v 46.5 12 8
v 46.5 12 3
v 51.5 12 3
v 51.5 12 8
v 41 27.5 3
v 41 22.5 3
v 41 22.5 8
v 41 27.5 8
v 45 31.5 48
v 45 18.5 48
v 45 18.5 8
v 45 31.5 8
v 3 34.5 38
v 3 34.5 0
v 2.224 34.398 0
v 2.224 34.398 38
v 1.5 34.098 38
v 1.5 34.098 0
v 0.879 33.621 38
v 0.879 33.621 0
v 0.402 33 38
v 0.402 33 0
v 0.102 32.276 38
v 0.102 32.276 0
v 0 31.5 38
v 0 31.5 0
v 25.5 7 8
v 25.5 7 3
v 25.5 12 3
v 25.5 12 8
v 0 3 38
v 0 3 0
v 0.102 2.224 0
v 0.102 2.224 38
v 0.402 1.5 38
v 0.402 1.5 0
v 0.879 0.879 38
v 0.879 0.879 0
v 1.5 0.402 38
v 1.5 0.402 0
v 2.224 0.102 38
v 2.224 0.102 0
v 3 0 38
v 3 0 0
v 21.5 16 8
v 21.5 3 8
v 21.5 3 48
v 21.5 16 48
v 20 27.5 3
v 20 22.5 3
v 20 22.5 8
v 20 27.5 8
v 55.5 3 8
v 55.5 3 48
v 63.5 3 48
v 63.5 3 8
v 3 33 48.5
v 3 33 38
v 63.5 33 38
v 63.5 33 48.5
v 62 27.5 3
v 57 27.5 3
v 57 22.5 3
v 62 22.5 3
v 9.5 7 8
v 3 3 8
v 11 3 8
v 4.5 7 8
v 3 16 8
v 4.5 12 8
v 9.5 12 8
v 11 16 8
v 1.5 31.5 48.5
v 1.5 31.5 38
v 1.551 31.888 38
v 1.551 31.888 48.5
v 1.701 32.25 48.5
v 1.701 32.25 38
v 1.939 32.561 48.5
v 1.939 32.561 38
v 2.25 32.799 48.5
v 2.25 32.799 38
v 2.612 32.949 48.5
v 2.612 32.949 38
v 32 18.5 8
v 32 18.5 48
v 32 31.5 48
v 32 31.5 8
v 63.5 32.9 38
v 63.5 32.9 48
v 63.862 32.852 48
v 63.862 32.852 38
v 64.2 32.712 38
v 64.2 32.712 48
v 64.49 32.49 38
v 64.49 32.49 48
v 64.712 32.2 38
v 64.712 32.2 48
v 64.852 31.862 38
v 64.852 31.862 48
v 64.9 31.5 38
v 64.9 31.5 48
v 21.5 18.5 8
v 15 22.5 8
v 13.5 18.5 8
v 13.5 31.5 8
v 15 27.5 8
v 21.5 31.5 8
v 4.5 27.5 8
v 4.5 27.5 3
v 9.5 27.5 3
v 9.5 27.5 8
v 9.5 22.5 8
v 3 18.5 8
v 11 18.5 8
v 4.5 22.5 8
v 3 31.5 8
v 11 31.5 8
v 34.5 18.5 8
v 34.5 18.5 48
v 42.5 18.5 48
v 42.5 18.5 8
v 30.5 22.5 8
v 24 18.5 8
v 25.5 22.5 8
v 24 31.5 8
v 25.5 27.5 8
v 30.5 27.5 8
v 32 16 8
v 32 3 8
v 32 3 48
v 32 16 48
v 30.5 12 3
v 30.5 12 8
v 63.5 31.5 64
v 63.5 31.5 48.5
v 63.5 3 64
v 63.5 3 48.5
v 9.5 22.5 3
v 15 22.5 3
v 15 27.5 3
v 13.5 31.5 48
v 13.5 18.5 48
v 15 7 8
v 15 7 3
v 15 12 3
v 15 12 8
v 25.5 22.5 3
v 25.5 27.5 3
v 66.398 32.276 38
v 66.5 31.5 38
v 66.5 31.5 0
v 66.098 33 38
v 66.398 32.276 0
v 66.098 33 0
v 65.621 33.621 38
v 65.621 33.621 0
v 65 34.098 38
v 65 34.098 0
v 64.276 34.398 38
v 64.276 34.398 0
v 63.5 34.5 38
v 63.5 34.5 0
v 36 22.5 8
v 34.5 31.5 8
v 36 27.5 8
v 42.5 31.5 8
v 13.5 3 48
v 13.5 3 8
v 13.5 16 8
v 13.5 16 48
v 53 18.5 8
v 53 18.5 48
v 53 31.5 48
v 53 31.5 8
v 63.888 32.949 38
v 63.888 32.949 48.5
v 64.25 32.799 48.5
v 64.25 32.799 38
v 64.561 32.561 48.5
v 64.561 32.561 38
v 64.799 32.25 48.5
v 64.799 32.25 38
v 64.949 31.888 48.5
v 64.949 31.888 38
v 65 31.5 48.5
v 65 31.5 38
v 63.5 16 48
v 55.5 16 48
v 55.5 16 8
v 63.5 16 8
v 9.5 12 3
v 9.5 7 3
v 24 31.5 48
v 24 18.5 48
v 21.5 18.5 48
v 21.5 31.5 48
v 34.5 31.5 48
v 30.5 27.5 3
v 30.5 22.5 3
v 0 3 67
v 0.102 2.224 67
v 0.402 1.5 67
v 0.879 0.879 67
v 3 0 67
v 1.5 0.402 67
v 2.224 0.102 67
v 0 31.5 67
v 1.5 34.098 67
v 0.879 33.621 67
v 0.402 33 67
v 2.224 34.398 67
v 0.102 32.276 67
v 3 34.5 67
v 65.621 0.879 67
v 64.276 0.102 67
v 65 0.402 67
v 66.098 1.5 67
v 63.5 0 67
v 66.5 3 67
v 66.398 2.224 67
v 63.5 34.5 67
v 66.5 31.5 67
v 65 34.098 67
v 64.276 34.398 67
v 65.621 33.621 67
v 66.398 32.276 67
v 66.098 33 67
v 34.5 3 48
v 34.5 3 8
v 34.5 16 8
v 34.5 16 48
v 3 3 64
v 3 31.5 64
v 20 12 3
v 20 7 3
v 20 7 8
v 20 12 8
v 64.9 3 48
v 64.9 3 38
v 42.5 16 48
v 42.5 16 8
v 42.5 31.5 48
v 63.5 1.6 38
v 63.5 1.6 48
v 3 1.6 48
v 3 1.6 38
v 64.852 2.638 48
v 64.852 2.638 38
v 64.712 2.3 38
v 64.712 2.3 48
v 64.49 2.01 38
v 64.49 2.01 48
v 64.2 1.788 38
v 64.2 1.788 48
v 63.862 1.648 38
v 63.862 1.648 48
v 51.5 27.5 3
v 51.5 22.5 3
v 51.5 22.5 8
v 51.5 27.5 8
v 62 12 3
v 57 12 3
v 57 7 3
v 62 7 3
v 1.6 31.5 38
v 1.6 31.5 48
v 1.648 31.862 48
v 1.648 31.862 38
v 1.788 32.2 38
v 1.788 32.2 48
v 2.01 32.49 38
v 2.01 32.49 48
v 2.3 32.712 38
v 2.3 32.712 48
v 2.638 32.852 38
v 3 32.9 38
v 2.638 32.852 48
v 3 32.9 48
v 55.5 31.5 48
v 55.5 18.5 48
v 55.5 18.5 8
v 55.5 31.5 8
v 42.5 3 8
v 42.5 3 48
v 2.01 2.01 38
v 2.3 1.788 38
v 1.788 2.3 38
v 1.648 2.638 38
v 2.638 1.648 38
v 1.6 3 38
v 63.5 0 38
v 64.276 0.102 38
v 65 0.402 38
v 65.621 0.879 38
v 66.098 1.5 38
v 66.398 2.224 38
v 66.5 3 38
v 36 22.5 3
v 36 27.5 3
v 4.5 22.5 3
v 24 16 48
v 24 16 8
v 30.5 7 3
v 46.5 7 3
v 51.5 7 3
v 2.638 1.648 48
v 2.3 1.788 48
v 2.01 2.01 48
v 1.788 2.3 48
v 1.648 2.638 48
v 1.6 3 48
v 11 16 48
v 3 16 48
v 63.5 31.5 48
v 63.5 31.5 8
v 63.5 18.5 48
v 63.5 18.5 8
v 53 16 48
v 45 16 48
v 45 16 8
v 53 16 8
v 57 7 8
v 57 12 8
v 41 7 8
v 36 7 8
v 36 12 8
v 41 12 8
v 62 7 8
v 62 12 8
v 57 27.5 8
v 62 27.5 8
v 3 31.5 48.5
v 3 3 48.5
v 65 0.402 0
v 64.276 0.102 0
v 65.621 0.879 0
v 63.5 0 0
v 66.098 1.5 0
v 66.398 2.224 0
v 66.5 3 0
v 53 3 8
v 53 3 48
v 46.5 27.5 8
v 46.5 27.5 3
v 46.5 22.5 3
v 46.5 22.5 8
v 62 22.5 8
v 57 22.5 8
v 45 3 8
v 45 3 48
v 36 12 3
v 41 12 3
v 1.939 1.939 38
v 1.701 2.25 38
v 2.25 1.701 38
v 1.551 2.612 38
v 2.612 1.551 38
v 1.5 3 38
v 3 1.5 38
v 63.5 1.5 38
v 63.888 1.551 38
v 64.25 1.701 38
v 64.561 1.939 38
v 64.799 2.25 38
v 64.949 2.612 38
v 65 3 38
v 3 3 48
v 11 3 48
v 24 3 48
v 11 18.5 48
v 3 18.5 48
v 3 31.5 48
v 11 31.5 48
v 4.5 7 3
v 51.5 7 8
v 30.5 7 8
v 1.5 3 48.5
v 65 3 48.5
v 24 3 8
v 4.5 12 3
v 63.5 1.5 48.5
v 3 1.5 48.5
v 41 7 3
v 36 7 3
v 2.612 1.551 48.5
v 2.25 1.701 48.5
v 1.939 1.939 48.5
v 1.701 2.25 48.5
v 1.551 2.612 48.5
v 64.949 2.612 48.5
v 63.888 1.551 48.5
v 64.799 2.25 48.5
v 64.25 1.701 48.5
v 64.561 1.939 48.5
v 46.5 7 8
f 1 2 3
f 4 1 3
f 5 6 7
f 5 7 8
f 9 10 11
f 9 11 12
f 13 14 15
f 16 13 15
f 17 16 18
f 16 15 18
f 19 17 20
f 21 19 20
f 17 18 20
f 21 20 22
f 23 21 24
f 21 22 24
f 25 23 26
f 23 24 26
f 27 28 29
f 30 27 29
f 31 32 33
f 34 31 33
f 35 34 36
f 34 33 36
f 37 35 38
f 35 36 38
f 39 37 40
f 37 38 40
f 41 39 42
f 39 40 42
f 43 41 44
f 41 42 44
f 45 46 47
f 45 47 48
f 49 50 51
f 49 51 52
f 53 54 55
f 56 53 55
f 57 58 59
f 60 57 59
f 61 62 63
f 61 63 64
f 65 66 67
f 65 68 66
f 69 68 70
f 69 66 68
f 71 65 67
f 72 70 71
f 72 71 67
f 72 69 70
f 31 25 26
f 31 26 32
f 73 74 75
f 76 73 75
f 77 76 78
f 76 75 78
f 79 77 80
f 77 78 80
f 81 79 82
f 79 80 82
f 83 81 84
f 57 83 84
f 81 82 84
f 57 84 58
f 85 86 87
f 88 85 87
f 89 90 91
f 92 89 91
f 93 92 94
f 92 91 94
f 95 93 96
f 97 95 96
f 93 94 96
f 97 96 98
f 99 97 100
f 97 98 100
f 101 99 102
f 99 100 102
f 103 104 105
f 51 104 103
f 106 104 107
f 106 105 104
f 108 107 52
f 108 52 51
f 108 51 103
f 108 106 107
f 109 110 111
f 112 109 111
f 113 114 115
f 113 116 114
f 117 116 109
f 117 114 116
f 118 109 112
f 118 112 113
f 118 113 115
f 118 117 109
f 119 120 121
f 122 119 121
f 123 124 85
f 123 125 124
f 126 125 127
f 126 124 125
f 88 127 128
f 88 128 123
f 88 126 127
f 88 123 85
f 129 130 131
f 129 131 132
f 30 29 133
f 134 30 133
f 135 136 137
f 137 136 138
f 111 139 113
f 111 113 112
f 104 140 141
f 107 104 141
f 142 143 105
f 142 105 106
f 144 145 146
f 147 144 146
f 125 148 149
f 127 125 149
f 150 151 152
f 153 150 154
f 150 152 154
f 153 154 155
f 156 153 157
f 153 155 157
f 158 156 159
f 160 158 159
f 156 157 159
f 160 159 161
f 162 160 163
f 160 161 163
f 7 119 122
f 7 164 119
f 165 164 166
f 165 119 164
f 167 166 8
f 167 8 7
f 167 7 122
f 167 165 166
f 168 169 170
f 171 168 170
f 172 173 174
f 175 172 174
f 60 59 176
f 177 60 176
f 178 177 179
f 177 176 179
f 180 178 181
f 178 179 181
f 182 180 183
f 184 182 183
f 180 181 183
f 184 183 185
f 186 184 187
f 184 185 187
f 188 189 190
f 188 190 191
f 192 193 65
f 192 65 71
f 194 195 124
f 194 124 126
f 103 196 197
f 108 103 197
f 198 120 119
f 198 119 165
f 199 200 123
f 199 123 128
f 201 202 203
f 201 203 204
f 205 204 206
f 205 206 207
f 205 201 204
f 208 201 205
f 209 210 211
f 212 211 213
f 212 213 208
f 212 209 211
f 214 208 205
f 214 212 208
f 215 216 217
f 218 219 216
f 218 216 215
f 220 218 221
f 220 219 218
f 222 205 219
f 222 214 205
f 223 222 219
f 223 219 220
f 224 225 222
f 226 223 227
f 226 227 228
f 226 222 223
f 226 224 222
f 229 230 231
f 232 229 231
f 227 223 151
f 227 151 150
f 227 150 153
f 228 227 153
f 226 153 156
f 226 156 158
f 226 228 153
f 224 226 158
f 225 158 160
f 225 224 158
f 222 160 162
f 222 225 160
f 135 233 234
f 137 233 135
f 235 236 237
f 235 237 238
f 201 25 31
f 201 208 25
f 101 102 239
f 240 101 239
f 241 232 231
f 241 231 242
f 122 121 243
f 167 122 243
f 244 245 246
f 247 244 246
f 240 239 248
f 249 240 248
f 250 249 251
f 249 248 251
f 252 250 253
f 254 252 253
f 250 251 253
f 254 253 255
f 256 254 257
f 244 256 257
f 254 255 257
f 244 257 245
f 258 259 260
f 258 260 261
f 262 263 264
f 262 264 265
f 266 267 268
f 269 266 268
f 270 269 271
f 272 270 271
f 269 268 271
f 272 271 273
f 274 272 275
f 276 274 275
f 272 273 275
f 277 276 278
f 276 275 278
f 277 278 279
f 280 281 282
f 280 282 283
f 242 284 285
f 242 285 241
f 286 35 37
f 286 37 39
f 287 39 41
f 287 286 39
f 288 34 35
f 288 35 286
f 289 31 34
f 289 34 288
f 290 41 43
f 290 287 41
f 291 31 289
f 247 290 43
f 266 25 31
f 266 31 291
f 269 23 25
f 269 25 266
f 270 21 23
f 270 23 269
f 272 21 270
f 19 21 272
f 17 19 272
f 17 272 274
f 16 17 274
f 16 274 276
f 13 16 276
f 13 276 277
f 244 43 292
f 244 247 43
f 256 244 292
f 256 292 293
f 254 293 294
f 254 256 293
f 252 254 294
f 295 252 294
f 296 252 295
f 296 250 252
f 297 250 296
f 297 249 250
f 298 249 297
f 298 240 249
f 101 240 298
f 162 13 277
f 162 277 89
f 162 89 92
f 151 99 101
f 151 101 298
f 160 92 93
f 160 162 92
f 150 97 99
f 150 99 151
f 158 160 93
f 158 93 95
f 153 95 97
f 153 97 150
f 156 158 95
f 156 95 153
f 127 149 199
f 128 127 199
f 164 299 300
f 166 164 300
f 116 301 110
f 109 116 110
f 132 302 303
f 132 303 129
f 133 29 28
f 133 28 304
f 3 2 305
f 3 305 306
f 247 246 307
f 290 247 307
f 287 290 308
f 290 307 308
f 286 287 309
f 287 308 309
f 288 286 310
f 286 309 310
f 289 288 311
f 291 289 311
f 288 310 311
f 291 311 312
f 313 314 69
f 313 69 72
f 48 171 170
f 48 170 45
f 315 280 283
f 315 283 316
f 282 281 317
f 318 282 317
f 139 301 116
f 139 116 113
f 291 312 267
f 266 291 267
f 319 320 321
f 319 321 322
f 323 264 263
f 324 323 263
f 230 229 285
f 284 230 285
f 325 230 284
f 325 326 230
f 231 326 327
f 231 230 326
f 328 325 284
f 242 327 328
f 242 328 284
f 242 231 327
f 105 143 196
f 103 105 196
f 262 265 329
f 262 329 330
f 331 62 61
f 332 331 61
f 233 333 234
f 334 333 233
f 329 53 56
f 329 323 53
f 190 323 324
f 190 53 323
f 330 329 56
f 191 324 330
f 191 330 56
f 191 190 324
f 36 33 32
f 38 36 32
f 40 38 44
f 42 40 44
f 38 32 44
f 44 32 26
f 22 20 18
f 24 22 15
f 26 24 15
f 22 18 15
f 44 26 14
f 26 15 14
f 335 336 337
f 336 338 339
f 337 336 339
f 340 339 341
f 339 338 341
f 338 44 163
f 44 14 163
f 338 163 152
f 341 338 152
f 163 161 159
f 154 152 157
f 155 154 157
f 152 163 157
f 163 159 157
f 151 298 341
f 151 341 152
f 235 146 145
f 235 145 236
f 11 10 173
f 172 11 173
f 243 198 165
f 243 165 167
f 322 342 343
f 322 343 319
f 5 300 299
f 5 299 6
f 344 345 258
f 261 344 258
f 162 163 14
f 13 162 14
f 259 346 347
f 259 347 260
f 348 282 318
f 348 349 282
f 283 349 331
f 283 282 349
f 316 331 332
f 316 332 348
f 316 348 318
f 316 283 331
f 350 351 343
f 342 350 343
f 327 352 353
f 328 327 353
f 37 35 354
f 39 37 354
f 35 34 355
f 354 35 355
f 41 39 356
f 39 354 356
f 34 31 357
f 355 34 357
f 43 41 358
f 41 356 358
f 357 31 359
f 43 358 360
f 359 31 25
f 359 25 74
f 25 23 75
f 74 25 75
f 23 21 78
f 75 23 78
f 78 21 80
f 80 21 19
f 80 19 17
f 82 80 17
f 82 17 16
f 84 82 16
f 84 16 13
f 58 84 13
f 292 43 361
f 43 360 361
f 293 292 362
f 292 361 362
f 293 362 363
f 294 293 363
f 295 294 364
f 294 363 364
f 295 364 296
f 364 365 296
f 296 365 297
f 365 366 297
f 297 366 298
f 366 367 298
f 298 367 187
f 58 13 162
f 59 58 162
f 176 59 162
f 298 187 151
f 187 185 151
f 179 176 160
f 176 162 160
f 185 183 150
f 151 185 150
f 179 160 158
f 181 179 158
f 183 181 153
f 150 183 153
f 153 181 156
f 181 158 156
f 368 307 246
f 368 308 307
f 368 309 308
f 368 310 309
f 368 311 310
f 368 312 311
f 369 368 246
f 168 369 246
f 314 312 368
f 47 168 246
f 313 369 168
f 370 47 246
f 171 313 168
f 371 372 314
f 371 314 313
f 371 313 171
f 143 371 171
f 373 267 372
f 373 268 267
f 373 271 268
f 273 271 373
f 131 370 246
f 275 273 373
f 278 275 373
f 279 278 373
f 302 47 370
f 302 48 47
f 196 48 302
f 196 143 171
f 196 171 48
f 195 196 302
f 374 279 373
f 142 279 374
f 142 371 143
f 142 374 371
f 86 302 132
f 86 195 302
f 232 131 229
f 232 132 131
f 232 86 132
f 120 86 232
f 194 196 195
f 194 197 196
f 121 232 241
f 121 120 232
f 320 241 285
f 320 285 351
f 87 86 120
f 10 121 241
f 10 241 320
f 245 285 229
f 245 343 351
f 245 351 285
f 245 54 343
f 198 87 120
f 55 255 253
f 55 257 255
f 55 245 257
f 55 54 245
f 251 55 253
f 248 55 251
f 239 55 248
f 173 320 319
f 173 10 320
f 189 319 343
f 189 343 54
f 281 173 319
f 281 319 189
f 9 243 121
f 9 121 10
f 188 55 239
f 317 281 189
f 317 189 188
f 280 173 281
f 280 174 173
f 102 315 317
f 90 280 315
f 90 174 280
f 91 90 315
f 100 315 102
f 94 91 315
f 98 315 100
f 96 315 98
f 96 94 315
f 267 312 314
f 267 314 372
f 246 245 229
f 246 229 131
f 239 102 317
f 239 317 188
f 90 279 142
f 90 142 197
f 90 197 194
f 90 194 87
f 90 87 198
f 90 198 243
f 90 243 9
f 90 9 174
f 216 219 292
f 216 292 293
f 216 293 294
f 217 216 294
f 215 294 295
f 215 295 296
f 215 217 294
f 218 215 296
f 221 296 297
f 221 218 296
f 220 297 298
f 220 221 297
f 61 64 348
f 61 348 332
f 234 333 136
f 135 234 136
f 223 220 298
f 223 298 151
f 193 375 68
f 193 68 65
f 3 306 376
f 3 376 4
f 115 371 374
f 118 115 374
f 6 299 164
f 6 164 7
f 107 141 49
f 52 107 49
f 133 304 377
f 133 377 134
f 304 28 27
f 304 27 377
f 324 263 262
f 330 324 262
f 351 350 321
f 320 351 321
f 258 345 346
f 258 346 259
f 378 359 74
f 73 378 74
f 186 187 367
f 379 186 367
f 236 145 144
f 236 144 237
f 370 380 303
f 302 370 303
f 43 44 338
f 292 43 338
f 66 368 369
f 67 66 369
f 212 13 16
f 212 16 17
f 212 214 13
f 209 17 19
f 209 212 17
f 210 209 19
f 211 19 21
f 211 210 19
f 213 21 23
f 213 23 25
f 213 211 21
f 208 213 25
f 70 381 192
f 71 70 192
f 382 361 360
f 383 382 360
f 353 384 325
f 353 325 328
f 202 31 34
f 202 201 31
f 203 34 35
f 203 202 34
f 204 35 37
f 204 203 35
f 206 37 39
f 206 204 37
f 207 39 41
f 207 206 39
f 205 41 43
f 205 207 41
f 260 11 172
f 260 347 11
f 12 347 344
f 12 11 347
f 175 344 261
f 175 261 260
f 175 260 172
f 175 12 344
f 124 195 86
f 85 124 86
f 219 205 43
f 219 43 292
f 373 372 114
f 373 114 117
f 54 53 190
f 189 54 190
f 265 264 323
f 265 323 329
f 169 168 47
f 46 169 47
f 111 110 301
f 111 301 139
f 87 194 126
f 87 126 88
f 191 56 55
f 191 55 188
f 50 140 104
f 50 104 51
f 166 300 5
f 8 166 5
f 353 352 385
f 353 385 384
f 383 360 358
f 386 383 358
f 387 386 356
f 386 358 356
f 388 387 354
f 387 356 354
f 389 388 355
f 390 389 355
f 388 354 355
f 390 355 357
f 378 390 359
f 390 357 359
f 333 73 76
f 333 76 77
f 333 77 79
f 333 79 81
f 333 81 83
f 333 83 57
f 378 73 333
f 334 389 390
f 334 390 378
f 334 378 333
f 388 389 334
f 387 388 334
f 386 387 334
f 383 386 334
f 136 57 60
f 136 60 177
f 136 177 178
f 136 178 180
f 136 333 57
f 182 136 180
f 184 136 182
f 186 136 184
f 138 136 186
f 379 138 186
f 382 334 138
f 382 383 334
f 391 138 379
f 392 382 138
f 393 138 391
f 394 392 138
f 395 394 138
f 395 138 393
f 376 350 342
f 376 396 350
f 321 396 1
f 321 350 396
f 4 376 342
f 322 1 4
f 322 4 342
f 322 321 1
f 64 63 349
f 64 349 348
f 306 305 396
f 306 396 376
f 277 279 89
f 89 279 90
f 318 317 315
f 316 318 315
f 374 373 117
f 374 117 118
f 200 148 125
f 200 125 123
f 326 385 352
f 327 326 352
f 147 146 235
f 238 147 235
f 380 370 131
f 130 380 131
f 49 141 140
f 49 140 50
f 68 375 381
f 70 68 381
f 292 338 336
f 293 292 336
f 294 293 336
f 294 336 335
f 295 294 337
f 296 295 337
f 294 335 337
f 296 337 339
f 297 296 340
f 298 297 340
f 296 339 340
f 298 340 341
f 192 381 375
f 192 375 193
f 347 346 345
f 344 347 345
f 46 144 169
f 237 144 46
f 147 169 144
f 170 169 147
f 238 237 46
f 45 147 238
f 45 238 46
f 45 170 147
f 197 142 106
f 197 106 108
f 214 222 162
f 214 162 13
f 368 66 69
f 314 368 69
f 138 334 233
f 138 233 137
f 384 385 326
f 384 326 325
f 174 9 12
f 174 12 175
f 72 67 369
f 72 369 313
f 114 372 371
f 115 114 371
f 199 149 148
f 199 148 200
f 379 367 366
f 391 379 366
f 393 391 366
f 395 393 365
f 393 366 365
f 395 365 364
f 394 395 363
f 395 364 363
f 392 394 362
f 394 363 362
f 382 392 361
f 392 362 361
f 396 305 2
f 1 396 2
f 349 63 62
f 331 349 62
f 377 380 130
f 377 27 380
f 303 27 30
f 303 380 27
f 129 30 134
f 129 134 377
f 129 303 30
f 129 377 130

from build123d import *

# Parameters (mm, degrees)
F1_DEPTH      = 3
F2_W          = 5
F2_H          = 5
F3_DEPTH      = 5
F4_W          = 8
F4_H          = 13
F5_DEPTH      = 40
F7_DEPTH      = 10
F9_DEPTH      = 19
F9_DEPTH_BACK = 10
F10_W         = 60.5
F10_H         = 28.5
F11_DEPTH     = 26
F13_DEPTH     = 10.5


with BuildPart() as f1:
    # F0 (on Top) → F1 (new body)
    with BuildSketch(Plane.XY):
        with BuildLine():
            ThreePointArc((0, 3), (0.8786796564, 0.8786796564), (3, 0))
            Line((3, 0), (63.5, 0))
            ThreePointArc((63.5, 0), (65.6213203436, 0.8786796564), (66.5, 3))
            Line((66.5, 3), (66.5, 31.5))
            ThreePointArc((66.5, 31.5), (65.6213203436, 33.6213203436), (63.5, 34.5))
            Line((63.5, 34.5), (3, 34.5))
            ThreePointArc((3, 34.5), (0.8786796564, 33.6213203436), (0, 31.5))
            Line((0, 31.5), (0, 3))
        make_face()
    extrude(amount=F1_DEPTH)

    # F2 (on face) → F3 (join)
    with BuildSketch(Plane.XY.offset(3)):
        with BuildLine():
            Line((3, 0), (63.5, 0))
            ThreePointArc((63.5, 0), (65.6213203436, 0.8786796564), (66.5, 3))
            Line((66.5, 3), (66.5, 31.5))
            ThreePointArc((66.5, 31.5), (65.6213203436, 33.6213203436), (63.5, 34.5))
            Line((63.5, 34.5), (3, 34.5))
            ThreePointArc((3, 34.5), (0.8786796564, 33.6213203436), (0, 31.5))
            Line((0, 31.5), (0, 3))
            ThreePointArc((0, 3), (0.8786796564, 0.8786796564), (3, 0))
        make_face()
        with Locations((7, 9.5)):
            Rectangle(F2_W, F2_H, mode=Mode.SUBTRACT)
        with Locations((17.5, 9.5)):
            Rectangle(F2_W, F2_H, mode=Mode.SUBTRACT)
        with Locations((28, 9.5)):
            Rectangle(F2_W, F2_H, mode=Mode.SUBTRACT)
        with Locations((38.5, 9.5)):
            Rectangle(F2_W, F2_H, mode=Mode.SUBTRACT)
        with Locations((49, 9.5)):
            Rectangle(F2_W, F2_H, mode=Mode.SUBTRACT)
        with Locations((59.5, 9.5)):
            Rectangle(F2_W, F2_H, mode=Mode.SUBTRACT)
        with Locations((7, 25)):
            Rectangle(F2_W, F2_H, mode=Mode.SUBTRACT)
        with Locations((17.5, 25)):
            Rectangle(F2_W, F2_H, mode=Mode.SUBTRACT)
        with Locations((28, 25)):
            Rectangle(F2_W, F2_H, mode=Mode.SUBTRACT)
        with Locations((38.5, 25)):
            Rectangle(F2_W, F2_H, mode=Mode.SUBTRACT)
        with Locations((49, 25)):
            Rectangle(F2_W, F2_H, mode=Mode.SUBTRACT)
        with Locations((59.5, 25)):
            Rectangle(F2_W, F2_H, mode=Mode.SUBTRACT)
    extrude(amount=F3_DEPTH)

    # F4 (on face) → F5 (join)
    with BuildSketch(Plane.XY.offset(8)):
        with BuildLine():
            Line((3, 0), (63.5, 0))
            ThreePointArc((63.5, 0), (65.6213203436, 0.8786796564), (66.5, 3))
            Line((66.5, 3), (66.5, 31.5))
            ThreePointArc((66.5, 31.5), (65.6213203436, 33.6213203436), (63.5, 34.5))
            Line((63.5, 34.5), (3, 34.5))
            ThreePointArc((3, 34.5), (0.8786796564, 33.6213203436), (0, 31.5))
            Line((0, 31.5), (0, 3))
            ThreePointArc((0, 3), (0.8786796564, 0.8786796564), (3, 0))
        make_face()
        with Locations((7, 9.5)):
            Rectangle(F4_W, F4_H, mode=Mode.SUBTRACT)
        with Locations((17.5, 9.5)):
            Rectangle(F4_W, F4_H, mode=Mode.SUBTRACT)
        with Locations((28, 9.5)):
            Rectangle(F4_W, F4_H, mode=Mode.SUBTRACT)
        with Locations((38.5, 9.5)):
            Rectangle(F4_W, F4_H, mode=Mode.SUBTRACT)
        with Locations((49, 9.5)):
            Rectangle(F4_W, F4_H, mode=Mode.SUBTRACT)
        with Locations((59.5, 9.5)):
            Rectangle(F4_W, F4_H, mode=Mode.SUBTRACT)
        with Locations((7, 25)):
            Rectangle(F4_W, F4_H, mode=Mode.SUBTRACT)
        with Locations((17.5, 25)):
            Rectangle(F4_W, F4_H, mode=Mode.SUBTRACT)
        with Locations((28, 25)):
            Rectangle(F4_W, F4_H, mode=Mode.SUBTRACT)
        with Locations((38.5, 25)):
            Rectangle(F4_W, F4_H, mode=Mode.SUBTRACT)
        with Locations((49, 25)):
            Rectangle(F4_W, F4_H, mode=Mode.SUBTRACT)
        with Locations((59.5, 25)):
            Rectangle(F4_W, F4_H, mode=Mode.SUBTRACT)
    extrude(amount=F5_DEPTH)

    # F6 (on face) → F7 (cut)
    with BuildSketch(Plane.XY.offset(48)):
        with BuildLine():
            Line((63.5, 34.5), (3, 34.5))
            ThreePointArc((3, 34.5), (0.8786796564, 33.6213203436), (0, 31.5))
            Line((0, 31.5), (0, 3))
            ThreePointArc((0, 3), (0.8786796564, 0.8786796564), (3, 0))
            Line((3, 0), (63.5, 0))
            ThreePointArc((63.5, 0), (65.6213203436, 0.8786796564), (66.5, 3))
            Line((66.5, 3), (66.5, 31.5))
            ThreePointArc((66.5, 31.5), (65.6213203436, 33.6213203436), (63.5, 34.5))
        make_face()
        with BuildLine():
            ThreePointArc((1.6, 31.5), (2.0100505063, 32.4899494937), (3, 32.9))
            Line((3, 32.9), (63.5, 32.9))
            ThreePointArc((63.5, 32.9), (64.4899494937, 32.4899494937), (64.9, 31.5))
            Line((64.9, 31.5), (64.9, 3))
            ThreePointArc((64.9, 3), (64.4899494937, 2.0100505063), (63.5, 1.6))
            Line((63.5, 1.6), (3, 1.6))
            ThreePointArc((3, 1.6), (2.0100505063, 2.0100505063), (1.6, 3))
            Line((1.6, 3), (1.6, 31.5))
        make_face(mode=Mode.SUBTRACT)
    extrude(amount=-F7_DEPTH, mode=Mode.SUBTRACT)


with BuildPart() as f9:
    # F8 (on face) → F9 (new body, two sides)
    with BuildSketch(Plane.XY.offset(48)) as f9_sk:
        with BuildLine():
            ThreePointArc((0, 3), (0.8786796564, 0.8786796564), (3, 0))
            Line((3, 0), (63.5, 0))
            ThreePointArc((63.5, 0), (65.6213203436, 0.8786796564), (66.5, 3))
            Line((66.5, 3), (66.5, 31.5))
            ThreePointArc((66.5, 31.5), (65.6213203436, 33.6213203436), (63.5, 34.5))
            Line((63.5, 34.5), (3, 34.5))
            ThreePointArc((3, 34.5), (0.8786796564, 33.6213203436), (0, 31.5))
            Line((0, 31.5), (0, 3))
        make_face()
    extrude(amount=F9_DEPTH)
    extrude(f9_sk.sketch, amount=-F9_DEPTH_BACK)

    # F10 (on face) → F11 (cut)
    with BuildSketch(Plane(origin=(0, 0, 38), x_dir=(1, 0, 0), z_dir=(0, 0, -1))):
        with Locations((33.25, -17.25)):
            Rectangle(F10_W, F10_H)
    extrude(amount=-F11_DEPTH, mode=Mode.SUBTRACT)

    # F12 (on face) → F13 (cut)
    with BuildSketch(Plane(origin=(0, 0, 38), x_dir=(1, 0, 0), z_dir=(0, 0, -1))):
        with BuildLine():
            ThreePointArc((3, -1.5), (1.9393398282, -1.9393398282), (1.5, -3))
            Line((1.5, -3), (1.5, -31.5))
            ThreePointArc((1.5, -31.5), (1.9393398282, -32.5606601718), (3, -33))
            Line((3, -33), (63.5, -33))
            ThreePointArc((63.5, -33), (64.5606601718, -32.5606601718), (65, -31.5))
            Line((65, -31.5), (65, -3))
            ThreePointArc((65, -3), (64.5606601718, -1.9393398282), (63.5, -1.5))
            Line((63.5, -1.5), (3, -1.5))
        make_face()
    extrude(amount=-F13_DEPTH, mode=Mode.SUBTRACT)


solid = Compound([f1.part, f9.part])
